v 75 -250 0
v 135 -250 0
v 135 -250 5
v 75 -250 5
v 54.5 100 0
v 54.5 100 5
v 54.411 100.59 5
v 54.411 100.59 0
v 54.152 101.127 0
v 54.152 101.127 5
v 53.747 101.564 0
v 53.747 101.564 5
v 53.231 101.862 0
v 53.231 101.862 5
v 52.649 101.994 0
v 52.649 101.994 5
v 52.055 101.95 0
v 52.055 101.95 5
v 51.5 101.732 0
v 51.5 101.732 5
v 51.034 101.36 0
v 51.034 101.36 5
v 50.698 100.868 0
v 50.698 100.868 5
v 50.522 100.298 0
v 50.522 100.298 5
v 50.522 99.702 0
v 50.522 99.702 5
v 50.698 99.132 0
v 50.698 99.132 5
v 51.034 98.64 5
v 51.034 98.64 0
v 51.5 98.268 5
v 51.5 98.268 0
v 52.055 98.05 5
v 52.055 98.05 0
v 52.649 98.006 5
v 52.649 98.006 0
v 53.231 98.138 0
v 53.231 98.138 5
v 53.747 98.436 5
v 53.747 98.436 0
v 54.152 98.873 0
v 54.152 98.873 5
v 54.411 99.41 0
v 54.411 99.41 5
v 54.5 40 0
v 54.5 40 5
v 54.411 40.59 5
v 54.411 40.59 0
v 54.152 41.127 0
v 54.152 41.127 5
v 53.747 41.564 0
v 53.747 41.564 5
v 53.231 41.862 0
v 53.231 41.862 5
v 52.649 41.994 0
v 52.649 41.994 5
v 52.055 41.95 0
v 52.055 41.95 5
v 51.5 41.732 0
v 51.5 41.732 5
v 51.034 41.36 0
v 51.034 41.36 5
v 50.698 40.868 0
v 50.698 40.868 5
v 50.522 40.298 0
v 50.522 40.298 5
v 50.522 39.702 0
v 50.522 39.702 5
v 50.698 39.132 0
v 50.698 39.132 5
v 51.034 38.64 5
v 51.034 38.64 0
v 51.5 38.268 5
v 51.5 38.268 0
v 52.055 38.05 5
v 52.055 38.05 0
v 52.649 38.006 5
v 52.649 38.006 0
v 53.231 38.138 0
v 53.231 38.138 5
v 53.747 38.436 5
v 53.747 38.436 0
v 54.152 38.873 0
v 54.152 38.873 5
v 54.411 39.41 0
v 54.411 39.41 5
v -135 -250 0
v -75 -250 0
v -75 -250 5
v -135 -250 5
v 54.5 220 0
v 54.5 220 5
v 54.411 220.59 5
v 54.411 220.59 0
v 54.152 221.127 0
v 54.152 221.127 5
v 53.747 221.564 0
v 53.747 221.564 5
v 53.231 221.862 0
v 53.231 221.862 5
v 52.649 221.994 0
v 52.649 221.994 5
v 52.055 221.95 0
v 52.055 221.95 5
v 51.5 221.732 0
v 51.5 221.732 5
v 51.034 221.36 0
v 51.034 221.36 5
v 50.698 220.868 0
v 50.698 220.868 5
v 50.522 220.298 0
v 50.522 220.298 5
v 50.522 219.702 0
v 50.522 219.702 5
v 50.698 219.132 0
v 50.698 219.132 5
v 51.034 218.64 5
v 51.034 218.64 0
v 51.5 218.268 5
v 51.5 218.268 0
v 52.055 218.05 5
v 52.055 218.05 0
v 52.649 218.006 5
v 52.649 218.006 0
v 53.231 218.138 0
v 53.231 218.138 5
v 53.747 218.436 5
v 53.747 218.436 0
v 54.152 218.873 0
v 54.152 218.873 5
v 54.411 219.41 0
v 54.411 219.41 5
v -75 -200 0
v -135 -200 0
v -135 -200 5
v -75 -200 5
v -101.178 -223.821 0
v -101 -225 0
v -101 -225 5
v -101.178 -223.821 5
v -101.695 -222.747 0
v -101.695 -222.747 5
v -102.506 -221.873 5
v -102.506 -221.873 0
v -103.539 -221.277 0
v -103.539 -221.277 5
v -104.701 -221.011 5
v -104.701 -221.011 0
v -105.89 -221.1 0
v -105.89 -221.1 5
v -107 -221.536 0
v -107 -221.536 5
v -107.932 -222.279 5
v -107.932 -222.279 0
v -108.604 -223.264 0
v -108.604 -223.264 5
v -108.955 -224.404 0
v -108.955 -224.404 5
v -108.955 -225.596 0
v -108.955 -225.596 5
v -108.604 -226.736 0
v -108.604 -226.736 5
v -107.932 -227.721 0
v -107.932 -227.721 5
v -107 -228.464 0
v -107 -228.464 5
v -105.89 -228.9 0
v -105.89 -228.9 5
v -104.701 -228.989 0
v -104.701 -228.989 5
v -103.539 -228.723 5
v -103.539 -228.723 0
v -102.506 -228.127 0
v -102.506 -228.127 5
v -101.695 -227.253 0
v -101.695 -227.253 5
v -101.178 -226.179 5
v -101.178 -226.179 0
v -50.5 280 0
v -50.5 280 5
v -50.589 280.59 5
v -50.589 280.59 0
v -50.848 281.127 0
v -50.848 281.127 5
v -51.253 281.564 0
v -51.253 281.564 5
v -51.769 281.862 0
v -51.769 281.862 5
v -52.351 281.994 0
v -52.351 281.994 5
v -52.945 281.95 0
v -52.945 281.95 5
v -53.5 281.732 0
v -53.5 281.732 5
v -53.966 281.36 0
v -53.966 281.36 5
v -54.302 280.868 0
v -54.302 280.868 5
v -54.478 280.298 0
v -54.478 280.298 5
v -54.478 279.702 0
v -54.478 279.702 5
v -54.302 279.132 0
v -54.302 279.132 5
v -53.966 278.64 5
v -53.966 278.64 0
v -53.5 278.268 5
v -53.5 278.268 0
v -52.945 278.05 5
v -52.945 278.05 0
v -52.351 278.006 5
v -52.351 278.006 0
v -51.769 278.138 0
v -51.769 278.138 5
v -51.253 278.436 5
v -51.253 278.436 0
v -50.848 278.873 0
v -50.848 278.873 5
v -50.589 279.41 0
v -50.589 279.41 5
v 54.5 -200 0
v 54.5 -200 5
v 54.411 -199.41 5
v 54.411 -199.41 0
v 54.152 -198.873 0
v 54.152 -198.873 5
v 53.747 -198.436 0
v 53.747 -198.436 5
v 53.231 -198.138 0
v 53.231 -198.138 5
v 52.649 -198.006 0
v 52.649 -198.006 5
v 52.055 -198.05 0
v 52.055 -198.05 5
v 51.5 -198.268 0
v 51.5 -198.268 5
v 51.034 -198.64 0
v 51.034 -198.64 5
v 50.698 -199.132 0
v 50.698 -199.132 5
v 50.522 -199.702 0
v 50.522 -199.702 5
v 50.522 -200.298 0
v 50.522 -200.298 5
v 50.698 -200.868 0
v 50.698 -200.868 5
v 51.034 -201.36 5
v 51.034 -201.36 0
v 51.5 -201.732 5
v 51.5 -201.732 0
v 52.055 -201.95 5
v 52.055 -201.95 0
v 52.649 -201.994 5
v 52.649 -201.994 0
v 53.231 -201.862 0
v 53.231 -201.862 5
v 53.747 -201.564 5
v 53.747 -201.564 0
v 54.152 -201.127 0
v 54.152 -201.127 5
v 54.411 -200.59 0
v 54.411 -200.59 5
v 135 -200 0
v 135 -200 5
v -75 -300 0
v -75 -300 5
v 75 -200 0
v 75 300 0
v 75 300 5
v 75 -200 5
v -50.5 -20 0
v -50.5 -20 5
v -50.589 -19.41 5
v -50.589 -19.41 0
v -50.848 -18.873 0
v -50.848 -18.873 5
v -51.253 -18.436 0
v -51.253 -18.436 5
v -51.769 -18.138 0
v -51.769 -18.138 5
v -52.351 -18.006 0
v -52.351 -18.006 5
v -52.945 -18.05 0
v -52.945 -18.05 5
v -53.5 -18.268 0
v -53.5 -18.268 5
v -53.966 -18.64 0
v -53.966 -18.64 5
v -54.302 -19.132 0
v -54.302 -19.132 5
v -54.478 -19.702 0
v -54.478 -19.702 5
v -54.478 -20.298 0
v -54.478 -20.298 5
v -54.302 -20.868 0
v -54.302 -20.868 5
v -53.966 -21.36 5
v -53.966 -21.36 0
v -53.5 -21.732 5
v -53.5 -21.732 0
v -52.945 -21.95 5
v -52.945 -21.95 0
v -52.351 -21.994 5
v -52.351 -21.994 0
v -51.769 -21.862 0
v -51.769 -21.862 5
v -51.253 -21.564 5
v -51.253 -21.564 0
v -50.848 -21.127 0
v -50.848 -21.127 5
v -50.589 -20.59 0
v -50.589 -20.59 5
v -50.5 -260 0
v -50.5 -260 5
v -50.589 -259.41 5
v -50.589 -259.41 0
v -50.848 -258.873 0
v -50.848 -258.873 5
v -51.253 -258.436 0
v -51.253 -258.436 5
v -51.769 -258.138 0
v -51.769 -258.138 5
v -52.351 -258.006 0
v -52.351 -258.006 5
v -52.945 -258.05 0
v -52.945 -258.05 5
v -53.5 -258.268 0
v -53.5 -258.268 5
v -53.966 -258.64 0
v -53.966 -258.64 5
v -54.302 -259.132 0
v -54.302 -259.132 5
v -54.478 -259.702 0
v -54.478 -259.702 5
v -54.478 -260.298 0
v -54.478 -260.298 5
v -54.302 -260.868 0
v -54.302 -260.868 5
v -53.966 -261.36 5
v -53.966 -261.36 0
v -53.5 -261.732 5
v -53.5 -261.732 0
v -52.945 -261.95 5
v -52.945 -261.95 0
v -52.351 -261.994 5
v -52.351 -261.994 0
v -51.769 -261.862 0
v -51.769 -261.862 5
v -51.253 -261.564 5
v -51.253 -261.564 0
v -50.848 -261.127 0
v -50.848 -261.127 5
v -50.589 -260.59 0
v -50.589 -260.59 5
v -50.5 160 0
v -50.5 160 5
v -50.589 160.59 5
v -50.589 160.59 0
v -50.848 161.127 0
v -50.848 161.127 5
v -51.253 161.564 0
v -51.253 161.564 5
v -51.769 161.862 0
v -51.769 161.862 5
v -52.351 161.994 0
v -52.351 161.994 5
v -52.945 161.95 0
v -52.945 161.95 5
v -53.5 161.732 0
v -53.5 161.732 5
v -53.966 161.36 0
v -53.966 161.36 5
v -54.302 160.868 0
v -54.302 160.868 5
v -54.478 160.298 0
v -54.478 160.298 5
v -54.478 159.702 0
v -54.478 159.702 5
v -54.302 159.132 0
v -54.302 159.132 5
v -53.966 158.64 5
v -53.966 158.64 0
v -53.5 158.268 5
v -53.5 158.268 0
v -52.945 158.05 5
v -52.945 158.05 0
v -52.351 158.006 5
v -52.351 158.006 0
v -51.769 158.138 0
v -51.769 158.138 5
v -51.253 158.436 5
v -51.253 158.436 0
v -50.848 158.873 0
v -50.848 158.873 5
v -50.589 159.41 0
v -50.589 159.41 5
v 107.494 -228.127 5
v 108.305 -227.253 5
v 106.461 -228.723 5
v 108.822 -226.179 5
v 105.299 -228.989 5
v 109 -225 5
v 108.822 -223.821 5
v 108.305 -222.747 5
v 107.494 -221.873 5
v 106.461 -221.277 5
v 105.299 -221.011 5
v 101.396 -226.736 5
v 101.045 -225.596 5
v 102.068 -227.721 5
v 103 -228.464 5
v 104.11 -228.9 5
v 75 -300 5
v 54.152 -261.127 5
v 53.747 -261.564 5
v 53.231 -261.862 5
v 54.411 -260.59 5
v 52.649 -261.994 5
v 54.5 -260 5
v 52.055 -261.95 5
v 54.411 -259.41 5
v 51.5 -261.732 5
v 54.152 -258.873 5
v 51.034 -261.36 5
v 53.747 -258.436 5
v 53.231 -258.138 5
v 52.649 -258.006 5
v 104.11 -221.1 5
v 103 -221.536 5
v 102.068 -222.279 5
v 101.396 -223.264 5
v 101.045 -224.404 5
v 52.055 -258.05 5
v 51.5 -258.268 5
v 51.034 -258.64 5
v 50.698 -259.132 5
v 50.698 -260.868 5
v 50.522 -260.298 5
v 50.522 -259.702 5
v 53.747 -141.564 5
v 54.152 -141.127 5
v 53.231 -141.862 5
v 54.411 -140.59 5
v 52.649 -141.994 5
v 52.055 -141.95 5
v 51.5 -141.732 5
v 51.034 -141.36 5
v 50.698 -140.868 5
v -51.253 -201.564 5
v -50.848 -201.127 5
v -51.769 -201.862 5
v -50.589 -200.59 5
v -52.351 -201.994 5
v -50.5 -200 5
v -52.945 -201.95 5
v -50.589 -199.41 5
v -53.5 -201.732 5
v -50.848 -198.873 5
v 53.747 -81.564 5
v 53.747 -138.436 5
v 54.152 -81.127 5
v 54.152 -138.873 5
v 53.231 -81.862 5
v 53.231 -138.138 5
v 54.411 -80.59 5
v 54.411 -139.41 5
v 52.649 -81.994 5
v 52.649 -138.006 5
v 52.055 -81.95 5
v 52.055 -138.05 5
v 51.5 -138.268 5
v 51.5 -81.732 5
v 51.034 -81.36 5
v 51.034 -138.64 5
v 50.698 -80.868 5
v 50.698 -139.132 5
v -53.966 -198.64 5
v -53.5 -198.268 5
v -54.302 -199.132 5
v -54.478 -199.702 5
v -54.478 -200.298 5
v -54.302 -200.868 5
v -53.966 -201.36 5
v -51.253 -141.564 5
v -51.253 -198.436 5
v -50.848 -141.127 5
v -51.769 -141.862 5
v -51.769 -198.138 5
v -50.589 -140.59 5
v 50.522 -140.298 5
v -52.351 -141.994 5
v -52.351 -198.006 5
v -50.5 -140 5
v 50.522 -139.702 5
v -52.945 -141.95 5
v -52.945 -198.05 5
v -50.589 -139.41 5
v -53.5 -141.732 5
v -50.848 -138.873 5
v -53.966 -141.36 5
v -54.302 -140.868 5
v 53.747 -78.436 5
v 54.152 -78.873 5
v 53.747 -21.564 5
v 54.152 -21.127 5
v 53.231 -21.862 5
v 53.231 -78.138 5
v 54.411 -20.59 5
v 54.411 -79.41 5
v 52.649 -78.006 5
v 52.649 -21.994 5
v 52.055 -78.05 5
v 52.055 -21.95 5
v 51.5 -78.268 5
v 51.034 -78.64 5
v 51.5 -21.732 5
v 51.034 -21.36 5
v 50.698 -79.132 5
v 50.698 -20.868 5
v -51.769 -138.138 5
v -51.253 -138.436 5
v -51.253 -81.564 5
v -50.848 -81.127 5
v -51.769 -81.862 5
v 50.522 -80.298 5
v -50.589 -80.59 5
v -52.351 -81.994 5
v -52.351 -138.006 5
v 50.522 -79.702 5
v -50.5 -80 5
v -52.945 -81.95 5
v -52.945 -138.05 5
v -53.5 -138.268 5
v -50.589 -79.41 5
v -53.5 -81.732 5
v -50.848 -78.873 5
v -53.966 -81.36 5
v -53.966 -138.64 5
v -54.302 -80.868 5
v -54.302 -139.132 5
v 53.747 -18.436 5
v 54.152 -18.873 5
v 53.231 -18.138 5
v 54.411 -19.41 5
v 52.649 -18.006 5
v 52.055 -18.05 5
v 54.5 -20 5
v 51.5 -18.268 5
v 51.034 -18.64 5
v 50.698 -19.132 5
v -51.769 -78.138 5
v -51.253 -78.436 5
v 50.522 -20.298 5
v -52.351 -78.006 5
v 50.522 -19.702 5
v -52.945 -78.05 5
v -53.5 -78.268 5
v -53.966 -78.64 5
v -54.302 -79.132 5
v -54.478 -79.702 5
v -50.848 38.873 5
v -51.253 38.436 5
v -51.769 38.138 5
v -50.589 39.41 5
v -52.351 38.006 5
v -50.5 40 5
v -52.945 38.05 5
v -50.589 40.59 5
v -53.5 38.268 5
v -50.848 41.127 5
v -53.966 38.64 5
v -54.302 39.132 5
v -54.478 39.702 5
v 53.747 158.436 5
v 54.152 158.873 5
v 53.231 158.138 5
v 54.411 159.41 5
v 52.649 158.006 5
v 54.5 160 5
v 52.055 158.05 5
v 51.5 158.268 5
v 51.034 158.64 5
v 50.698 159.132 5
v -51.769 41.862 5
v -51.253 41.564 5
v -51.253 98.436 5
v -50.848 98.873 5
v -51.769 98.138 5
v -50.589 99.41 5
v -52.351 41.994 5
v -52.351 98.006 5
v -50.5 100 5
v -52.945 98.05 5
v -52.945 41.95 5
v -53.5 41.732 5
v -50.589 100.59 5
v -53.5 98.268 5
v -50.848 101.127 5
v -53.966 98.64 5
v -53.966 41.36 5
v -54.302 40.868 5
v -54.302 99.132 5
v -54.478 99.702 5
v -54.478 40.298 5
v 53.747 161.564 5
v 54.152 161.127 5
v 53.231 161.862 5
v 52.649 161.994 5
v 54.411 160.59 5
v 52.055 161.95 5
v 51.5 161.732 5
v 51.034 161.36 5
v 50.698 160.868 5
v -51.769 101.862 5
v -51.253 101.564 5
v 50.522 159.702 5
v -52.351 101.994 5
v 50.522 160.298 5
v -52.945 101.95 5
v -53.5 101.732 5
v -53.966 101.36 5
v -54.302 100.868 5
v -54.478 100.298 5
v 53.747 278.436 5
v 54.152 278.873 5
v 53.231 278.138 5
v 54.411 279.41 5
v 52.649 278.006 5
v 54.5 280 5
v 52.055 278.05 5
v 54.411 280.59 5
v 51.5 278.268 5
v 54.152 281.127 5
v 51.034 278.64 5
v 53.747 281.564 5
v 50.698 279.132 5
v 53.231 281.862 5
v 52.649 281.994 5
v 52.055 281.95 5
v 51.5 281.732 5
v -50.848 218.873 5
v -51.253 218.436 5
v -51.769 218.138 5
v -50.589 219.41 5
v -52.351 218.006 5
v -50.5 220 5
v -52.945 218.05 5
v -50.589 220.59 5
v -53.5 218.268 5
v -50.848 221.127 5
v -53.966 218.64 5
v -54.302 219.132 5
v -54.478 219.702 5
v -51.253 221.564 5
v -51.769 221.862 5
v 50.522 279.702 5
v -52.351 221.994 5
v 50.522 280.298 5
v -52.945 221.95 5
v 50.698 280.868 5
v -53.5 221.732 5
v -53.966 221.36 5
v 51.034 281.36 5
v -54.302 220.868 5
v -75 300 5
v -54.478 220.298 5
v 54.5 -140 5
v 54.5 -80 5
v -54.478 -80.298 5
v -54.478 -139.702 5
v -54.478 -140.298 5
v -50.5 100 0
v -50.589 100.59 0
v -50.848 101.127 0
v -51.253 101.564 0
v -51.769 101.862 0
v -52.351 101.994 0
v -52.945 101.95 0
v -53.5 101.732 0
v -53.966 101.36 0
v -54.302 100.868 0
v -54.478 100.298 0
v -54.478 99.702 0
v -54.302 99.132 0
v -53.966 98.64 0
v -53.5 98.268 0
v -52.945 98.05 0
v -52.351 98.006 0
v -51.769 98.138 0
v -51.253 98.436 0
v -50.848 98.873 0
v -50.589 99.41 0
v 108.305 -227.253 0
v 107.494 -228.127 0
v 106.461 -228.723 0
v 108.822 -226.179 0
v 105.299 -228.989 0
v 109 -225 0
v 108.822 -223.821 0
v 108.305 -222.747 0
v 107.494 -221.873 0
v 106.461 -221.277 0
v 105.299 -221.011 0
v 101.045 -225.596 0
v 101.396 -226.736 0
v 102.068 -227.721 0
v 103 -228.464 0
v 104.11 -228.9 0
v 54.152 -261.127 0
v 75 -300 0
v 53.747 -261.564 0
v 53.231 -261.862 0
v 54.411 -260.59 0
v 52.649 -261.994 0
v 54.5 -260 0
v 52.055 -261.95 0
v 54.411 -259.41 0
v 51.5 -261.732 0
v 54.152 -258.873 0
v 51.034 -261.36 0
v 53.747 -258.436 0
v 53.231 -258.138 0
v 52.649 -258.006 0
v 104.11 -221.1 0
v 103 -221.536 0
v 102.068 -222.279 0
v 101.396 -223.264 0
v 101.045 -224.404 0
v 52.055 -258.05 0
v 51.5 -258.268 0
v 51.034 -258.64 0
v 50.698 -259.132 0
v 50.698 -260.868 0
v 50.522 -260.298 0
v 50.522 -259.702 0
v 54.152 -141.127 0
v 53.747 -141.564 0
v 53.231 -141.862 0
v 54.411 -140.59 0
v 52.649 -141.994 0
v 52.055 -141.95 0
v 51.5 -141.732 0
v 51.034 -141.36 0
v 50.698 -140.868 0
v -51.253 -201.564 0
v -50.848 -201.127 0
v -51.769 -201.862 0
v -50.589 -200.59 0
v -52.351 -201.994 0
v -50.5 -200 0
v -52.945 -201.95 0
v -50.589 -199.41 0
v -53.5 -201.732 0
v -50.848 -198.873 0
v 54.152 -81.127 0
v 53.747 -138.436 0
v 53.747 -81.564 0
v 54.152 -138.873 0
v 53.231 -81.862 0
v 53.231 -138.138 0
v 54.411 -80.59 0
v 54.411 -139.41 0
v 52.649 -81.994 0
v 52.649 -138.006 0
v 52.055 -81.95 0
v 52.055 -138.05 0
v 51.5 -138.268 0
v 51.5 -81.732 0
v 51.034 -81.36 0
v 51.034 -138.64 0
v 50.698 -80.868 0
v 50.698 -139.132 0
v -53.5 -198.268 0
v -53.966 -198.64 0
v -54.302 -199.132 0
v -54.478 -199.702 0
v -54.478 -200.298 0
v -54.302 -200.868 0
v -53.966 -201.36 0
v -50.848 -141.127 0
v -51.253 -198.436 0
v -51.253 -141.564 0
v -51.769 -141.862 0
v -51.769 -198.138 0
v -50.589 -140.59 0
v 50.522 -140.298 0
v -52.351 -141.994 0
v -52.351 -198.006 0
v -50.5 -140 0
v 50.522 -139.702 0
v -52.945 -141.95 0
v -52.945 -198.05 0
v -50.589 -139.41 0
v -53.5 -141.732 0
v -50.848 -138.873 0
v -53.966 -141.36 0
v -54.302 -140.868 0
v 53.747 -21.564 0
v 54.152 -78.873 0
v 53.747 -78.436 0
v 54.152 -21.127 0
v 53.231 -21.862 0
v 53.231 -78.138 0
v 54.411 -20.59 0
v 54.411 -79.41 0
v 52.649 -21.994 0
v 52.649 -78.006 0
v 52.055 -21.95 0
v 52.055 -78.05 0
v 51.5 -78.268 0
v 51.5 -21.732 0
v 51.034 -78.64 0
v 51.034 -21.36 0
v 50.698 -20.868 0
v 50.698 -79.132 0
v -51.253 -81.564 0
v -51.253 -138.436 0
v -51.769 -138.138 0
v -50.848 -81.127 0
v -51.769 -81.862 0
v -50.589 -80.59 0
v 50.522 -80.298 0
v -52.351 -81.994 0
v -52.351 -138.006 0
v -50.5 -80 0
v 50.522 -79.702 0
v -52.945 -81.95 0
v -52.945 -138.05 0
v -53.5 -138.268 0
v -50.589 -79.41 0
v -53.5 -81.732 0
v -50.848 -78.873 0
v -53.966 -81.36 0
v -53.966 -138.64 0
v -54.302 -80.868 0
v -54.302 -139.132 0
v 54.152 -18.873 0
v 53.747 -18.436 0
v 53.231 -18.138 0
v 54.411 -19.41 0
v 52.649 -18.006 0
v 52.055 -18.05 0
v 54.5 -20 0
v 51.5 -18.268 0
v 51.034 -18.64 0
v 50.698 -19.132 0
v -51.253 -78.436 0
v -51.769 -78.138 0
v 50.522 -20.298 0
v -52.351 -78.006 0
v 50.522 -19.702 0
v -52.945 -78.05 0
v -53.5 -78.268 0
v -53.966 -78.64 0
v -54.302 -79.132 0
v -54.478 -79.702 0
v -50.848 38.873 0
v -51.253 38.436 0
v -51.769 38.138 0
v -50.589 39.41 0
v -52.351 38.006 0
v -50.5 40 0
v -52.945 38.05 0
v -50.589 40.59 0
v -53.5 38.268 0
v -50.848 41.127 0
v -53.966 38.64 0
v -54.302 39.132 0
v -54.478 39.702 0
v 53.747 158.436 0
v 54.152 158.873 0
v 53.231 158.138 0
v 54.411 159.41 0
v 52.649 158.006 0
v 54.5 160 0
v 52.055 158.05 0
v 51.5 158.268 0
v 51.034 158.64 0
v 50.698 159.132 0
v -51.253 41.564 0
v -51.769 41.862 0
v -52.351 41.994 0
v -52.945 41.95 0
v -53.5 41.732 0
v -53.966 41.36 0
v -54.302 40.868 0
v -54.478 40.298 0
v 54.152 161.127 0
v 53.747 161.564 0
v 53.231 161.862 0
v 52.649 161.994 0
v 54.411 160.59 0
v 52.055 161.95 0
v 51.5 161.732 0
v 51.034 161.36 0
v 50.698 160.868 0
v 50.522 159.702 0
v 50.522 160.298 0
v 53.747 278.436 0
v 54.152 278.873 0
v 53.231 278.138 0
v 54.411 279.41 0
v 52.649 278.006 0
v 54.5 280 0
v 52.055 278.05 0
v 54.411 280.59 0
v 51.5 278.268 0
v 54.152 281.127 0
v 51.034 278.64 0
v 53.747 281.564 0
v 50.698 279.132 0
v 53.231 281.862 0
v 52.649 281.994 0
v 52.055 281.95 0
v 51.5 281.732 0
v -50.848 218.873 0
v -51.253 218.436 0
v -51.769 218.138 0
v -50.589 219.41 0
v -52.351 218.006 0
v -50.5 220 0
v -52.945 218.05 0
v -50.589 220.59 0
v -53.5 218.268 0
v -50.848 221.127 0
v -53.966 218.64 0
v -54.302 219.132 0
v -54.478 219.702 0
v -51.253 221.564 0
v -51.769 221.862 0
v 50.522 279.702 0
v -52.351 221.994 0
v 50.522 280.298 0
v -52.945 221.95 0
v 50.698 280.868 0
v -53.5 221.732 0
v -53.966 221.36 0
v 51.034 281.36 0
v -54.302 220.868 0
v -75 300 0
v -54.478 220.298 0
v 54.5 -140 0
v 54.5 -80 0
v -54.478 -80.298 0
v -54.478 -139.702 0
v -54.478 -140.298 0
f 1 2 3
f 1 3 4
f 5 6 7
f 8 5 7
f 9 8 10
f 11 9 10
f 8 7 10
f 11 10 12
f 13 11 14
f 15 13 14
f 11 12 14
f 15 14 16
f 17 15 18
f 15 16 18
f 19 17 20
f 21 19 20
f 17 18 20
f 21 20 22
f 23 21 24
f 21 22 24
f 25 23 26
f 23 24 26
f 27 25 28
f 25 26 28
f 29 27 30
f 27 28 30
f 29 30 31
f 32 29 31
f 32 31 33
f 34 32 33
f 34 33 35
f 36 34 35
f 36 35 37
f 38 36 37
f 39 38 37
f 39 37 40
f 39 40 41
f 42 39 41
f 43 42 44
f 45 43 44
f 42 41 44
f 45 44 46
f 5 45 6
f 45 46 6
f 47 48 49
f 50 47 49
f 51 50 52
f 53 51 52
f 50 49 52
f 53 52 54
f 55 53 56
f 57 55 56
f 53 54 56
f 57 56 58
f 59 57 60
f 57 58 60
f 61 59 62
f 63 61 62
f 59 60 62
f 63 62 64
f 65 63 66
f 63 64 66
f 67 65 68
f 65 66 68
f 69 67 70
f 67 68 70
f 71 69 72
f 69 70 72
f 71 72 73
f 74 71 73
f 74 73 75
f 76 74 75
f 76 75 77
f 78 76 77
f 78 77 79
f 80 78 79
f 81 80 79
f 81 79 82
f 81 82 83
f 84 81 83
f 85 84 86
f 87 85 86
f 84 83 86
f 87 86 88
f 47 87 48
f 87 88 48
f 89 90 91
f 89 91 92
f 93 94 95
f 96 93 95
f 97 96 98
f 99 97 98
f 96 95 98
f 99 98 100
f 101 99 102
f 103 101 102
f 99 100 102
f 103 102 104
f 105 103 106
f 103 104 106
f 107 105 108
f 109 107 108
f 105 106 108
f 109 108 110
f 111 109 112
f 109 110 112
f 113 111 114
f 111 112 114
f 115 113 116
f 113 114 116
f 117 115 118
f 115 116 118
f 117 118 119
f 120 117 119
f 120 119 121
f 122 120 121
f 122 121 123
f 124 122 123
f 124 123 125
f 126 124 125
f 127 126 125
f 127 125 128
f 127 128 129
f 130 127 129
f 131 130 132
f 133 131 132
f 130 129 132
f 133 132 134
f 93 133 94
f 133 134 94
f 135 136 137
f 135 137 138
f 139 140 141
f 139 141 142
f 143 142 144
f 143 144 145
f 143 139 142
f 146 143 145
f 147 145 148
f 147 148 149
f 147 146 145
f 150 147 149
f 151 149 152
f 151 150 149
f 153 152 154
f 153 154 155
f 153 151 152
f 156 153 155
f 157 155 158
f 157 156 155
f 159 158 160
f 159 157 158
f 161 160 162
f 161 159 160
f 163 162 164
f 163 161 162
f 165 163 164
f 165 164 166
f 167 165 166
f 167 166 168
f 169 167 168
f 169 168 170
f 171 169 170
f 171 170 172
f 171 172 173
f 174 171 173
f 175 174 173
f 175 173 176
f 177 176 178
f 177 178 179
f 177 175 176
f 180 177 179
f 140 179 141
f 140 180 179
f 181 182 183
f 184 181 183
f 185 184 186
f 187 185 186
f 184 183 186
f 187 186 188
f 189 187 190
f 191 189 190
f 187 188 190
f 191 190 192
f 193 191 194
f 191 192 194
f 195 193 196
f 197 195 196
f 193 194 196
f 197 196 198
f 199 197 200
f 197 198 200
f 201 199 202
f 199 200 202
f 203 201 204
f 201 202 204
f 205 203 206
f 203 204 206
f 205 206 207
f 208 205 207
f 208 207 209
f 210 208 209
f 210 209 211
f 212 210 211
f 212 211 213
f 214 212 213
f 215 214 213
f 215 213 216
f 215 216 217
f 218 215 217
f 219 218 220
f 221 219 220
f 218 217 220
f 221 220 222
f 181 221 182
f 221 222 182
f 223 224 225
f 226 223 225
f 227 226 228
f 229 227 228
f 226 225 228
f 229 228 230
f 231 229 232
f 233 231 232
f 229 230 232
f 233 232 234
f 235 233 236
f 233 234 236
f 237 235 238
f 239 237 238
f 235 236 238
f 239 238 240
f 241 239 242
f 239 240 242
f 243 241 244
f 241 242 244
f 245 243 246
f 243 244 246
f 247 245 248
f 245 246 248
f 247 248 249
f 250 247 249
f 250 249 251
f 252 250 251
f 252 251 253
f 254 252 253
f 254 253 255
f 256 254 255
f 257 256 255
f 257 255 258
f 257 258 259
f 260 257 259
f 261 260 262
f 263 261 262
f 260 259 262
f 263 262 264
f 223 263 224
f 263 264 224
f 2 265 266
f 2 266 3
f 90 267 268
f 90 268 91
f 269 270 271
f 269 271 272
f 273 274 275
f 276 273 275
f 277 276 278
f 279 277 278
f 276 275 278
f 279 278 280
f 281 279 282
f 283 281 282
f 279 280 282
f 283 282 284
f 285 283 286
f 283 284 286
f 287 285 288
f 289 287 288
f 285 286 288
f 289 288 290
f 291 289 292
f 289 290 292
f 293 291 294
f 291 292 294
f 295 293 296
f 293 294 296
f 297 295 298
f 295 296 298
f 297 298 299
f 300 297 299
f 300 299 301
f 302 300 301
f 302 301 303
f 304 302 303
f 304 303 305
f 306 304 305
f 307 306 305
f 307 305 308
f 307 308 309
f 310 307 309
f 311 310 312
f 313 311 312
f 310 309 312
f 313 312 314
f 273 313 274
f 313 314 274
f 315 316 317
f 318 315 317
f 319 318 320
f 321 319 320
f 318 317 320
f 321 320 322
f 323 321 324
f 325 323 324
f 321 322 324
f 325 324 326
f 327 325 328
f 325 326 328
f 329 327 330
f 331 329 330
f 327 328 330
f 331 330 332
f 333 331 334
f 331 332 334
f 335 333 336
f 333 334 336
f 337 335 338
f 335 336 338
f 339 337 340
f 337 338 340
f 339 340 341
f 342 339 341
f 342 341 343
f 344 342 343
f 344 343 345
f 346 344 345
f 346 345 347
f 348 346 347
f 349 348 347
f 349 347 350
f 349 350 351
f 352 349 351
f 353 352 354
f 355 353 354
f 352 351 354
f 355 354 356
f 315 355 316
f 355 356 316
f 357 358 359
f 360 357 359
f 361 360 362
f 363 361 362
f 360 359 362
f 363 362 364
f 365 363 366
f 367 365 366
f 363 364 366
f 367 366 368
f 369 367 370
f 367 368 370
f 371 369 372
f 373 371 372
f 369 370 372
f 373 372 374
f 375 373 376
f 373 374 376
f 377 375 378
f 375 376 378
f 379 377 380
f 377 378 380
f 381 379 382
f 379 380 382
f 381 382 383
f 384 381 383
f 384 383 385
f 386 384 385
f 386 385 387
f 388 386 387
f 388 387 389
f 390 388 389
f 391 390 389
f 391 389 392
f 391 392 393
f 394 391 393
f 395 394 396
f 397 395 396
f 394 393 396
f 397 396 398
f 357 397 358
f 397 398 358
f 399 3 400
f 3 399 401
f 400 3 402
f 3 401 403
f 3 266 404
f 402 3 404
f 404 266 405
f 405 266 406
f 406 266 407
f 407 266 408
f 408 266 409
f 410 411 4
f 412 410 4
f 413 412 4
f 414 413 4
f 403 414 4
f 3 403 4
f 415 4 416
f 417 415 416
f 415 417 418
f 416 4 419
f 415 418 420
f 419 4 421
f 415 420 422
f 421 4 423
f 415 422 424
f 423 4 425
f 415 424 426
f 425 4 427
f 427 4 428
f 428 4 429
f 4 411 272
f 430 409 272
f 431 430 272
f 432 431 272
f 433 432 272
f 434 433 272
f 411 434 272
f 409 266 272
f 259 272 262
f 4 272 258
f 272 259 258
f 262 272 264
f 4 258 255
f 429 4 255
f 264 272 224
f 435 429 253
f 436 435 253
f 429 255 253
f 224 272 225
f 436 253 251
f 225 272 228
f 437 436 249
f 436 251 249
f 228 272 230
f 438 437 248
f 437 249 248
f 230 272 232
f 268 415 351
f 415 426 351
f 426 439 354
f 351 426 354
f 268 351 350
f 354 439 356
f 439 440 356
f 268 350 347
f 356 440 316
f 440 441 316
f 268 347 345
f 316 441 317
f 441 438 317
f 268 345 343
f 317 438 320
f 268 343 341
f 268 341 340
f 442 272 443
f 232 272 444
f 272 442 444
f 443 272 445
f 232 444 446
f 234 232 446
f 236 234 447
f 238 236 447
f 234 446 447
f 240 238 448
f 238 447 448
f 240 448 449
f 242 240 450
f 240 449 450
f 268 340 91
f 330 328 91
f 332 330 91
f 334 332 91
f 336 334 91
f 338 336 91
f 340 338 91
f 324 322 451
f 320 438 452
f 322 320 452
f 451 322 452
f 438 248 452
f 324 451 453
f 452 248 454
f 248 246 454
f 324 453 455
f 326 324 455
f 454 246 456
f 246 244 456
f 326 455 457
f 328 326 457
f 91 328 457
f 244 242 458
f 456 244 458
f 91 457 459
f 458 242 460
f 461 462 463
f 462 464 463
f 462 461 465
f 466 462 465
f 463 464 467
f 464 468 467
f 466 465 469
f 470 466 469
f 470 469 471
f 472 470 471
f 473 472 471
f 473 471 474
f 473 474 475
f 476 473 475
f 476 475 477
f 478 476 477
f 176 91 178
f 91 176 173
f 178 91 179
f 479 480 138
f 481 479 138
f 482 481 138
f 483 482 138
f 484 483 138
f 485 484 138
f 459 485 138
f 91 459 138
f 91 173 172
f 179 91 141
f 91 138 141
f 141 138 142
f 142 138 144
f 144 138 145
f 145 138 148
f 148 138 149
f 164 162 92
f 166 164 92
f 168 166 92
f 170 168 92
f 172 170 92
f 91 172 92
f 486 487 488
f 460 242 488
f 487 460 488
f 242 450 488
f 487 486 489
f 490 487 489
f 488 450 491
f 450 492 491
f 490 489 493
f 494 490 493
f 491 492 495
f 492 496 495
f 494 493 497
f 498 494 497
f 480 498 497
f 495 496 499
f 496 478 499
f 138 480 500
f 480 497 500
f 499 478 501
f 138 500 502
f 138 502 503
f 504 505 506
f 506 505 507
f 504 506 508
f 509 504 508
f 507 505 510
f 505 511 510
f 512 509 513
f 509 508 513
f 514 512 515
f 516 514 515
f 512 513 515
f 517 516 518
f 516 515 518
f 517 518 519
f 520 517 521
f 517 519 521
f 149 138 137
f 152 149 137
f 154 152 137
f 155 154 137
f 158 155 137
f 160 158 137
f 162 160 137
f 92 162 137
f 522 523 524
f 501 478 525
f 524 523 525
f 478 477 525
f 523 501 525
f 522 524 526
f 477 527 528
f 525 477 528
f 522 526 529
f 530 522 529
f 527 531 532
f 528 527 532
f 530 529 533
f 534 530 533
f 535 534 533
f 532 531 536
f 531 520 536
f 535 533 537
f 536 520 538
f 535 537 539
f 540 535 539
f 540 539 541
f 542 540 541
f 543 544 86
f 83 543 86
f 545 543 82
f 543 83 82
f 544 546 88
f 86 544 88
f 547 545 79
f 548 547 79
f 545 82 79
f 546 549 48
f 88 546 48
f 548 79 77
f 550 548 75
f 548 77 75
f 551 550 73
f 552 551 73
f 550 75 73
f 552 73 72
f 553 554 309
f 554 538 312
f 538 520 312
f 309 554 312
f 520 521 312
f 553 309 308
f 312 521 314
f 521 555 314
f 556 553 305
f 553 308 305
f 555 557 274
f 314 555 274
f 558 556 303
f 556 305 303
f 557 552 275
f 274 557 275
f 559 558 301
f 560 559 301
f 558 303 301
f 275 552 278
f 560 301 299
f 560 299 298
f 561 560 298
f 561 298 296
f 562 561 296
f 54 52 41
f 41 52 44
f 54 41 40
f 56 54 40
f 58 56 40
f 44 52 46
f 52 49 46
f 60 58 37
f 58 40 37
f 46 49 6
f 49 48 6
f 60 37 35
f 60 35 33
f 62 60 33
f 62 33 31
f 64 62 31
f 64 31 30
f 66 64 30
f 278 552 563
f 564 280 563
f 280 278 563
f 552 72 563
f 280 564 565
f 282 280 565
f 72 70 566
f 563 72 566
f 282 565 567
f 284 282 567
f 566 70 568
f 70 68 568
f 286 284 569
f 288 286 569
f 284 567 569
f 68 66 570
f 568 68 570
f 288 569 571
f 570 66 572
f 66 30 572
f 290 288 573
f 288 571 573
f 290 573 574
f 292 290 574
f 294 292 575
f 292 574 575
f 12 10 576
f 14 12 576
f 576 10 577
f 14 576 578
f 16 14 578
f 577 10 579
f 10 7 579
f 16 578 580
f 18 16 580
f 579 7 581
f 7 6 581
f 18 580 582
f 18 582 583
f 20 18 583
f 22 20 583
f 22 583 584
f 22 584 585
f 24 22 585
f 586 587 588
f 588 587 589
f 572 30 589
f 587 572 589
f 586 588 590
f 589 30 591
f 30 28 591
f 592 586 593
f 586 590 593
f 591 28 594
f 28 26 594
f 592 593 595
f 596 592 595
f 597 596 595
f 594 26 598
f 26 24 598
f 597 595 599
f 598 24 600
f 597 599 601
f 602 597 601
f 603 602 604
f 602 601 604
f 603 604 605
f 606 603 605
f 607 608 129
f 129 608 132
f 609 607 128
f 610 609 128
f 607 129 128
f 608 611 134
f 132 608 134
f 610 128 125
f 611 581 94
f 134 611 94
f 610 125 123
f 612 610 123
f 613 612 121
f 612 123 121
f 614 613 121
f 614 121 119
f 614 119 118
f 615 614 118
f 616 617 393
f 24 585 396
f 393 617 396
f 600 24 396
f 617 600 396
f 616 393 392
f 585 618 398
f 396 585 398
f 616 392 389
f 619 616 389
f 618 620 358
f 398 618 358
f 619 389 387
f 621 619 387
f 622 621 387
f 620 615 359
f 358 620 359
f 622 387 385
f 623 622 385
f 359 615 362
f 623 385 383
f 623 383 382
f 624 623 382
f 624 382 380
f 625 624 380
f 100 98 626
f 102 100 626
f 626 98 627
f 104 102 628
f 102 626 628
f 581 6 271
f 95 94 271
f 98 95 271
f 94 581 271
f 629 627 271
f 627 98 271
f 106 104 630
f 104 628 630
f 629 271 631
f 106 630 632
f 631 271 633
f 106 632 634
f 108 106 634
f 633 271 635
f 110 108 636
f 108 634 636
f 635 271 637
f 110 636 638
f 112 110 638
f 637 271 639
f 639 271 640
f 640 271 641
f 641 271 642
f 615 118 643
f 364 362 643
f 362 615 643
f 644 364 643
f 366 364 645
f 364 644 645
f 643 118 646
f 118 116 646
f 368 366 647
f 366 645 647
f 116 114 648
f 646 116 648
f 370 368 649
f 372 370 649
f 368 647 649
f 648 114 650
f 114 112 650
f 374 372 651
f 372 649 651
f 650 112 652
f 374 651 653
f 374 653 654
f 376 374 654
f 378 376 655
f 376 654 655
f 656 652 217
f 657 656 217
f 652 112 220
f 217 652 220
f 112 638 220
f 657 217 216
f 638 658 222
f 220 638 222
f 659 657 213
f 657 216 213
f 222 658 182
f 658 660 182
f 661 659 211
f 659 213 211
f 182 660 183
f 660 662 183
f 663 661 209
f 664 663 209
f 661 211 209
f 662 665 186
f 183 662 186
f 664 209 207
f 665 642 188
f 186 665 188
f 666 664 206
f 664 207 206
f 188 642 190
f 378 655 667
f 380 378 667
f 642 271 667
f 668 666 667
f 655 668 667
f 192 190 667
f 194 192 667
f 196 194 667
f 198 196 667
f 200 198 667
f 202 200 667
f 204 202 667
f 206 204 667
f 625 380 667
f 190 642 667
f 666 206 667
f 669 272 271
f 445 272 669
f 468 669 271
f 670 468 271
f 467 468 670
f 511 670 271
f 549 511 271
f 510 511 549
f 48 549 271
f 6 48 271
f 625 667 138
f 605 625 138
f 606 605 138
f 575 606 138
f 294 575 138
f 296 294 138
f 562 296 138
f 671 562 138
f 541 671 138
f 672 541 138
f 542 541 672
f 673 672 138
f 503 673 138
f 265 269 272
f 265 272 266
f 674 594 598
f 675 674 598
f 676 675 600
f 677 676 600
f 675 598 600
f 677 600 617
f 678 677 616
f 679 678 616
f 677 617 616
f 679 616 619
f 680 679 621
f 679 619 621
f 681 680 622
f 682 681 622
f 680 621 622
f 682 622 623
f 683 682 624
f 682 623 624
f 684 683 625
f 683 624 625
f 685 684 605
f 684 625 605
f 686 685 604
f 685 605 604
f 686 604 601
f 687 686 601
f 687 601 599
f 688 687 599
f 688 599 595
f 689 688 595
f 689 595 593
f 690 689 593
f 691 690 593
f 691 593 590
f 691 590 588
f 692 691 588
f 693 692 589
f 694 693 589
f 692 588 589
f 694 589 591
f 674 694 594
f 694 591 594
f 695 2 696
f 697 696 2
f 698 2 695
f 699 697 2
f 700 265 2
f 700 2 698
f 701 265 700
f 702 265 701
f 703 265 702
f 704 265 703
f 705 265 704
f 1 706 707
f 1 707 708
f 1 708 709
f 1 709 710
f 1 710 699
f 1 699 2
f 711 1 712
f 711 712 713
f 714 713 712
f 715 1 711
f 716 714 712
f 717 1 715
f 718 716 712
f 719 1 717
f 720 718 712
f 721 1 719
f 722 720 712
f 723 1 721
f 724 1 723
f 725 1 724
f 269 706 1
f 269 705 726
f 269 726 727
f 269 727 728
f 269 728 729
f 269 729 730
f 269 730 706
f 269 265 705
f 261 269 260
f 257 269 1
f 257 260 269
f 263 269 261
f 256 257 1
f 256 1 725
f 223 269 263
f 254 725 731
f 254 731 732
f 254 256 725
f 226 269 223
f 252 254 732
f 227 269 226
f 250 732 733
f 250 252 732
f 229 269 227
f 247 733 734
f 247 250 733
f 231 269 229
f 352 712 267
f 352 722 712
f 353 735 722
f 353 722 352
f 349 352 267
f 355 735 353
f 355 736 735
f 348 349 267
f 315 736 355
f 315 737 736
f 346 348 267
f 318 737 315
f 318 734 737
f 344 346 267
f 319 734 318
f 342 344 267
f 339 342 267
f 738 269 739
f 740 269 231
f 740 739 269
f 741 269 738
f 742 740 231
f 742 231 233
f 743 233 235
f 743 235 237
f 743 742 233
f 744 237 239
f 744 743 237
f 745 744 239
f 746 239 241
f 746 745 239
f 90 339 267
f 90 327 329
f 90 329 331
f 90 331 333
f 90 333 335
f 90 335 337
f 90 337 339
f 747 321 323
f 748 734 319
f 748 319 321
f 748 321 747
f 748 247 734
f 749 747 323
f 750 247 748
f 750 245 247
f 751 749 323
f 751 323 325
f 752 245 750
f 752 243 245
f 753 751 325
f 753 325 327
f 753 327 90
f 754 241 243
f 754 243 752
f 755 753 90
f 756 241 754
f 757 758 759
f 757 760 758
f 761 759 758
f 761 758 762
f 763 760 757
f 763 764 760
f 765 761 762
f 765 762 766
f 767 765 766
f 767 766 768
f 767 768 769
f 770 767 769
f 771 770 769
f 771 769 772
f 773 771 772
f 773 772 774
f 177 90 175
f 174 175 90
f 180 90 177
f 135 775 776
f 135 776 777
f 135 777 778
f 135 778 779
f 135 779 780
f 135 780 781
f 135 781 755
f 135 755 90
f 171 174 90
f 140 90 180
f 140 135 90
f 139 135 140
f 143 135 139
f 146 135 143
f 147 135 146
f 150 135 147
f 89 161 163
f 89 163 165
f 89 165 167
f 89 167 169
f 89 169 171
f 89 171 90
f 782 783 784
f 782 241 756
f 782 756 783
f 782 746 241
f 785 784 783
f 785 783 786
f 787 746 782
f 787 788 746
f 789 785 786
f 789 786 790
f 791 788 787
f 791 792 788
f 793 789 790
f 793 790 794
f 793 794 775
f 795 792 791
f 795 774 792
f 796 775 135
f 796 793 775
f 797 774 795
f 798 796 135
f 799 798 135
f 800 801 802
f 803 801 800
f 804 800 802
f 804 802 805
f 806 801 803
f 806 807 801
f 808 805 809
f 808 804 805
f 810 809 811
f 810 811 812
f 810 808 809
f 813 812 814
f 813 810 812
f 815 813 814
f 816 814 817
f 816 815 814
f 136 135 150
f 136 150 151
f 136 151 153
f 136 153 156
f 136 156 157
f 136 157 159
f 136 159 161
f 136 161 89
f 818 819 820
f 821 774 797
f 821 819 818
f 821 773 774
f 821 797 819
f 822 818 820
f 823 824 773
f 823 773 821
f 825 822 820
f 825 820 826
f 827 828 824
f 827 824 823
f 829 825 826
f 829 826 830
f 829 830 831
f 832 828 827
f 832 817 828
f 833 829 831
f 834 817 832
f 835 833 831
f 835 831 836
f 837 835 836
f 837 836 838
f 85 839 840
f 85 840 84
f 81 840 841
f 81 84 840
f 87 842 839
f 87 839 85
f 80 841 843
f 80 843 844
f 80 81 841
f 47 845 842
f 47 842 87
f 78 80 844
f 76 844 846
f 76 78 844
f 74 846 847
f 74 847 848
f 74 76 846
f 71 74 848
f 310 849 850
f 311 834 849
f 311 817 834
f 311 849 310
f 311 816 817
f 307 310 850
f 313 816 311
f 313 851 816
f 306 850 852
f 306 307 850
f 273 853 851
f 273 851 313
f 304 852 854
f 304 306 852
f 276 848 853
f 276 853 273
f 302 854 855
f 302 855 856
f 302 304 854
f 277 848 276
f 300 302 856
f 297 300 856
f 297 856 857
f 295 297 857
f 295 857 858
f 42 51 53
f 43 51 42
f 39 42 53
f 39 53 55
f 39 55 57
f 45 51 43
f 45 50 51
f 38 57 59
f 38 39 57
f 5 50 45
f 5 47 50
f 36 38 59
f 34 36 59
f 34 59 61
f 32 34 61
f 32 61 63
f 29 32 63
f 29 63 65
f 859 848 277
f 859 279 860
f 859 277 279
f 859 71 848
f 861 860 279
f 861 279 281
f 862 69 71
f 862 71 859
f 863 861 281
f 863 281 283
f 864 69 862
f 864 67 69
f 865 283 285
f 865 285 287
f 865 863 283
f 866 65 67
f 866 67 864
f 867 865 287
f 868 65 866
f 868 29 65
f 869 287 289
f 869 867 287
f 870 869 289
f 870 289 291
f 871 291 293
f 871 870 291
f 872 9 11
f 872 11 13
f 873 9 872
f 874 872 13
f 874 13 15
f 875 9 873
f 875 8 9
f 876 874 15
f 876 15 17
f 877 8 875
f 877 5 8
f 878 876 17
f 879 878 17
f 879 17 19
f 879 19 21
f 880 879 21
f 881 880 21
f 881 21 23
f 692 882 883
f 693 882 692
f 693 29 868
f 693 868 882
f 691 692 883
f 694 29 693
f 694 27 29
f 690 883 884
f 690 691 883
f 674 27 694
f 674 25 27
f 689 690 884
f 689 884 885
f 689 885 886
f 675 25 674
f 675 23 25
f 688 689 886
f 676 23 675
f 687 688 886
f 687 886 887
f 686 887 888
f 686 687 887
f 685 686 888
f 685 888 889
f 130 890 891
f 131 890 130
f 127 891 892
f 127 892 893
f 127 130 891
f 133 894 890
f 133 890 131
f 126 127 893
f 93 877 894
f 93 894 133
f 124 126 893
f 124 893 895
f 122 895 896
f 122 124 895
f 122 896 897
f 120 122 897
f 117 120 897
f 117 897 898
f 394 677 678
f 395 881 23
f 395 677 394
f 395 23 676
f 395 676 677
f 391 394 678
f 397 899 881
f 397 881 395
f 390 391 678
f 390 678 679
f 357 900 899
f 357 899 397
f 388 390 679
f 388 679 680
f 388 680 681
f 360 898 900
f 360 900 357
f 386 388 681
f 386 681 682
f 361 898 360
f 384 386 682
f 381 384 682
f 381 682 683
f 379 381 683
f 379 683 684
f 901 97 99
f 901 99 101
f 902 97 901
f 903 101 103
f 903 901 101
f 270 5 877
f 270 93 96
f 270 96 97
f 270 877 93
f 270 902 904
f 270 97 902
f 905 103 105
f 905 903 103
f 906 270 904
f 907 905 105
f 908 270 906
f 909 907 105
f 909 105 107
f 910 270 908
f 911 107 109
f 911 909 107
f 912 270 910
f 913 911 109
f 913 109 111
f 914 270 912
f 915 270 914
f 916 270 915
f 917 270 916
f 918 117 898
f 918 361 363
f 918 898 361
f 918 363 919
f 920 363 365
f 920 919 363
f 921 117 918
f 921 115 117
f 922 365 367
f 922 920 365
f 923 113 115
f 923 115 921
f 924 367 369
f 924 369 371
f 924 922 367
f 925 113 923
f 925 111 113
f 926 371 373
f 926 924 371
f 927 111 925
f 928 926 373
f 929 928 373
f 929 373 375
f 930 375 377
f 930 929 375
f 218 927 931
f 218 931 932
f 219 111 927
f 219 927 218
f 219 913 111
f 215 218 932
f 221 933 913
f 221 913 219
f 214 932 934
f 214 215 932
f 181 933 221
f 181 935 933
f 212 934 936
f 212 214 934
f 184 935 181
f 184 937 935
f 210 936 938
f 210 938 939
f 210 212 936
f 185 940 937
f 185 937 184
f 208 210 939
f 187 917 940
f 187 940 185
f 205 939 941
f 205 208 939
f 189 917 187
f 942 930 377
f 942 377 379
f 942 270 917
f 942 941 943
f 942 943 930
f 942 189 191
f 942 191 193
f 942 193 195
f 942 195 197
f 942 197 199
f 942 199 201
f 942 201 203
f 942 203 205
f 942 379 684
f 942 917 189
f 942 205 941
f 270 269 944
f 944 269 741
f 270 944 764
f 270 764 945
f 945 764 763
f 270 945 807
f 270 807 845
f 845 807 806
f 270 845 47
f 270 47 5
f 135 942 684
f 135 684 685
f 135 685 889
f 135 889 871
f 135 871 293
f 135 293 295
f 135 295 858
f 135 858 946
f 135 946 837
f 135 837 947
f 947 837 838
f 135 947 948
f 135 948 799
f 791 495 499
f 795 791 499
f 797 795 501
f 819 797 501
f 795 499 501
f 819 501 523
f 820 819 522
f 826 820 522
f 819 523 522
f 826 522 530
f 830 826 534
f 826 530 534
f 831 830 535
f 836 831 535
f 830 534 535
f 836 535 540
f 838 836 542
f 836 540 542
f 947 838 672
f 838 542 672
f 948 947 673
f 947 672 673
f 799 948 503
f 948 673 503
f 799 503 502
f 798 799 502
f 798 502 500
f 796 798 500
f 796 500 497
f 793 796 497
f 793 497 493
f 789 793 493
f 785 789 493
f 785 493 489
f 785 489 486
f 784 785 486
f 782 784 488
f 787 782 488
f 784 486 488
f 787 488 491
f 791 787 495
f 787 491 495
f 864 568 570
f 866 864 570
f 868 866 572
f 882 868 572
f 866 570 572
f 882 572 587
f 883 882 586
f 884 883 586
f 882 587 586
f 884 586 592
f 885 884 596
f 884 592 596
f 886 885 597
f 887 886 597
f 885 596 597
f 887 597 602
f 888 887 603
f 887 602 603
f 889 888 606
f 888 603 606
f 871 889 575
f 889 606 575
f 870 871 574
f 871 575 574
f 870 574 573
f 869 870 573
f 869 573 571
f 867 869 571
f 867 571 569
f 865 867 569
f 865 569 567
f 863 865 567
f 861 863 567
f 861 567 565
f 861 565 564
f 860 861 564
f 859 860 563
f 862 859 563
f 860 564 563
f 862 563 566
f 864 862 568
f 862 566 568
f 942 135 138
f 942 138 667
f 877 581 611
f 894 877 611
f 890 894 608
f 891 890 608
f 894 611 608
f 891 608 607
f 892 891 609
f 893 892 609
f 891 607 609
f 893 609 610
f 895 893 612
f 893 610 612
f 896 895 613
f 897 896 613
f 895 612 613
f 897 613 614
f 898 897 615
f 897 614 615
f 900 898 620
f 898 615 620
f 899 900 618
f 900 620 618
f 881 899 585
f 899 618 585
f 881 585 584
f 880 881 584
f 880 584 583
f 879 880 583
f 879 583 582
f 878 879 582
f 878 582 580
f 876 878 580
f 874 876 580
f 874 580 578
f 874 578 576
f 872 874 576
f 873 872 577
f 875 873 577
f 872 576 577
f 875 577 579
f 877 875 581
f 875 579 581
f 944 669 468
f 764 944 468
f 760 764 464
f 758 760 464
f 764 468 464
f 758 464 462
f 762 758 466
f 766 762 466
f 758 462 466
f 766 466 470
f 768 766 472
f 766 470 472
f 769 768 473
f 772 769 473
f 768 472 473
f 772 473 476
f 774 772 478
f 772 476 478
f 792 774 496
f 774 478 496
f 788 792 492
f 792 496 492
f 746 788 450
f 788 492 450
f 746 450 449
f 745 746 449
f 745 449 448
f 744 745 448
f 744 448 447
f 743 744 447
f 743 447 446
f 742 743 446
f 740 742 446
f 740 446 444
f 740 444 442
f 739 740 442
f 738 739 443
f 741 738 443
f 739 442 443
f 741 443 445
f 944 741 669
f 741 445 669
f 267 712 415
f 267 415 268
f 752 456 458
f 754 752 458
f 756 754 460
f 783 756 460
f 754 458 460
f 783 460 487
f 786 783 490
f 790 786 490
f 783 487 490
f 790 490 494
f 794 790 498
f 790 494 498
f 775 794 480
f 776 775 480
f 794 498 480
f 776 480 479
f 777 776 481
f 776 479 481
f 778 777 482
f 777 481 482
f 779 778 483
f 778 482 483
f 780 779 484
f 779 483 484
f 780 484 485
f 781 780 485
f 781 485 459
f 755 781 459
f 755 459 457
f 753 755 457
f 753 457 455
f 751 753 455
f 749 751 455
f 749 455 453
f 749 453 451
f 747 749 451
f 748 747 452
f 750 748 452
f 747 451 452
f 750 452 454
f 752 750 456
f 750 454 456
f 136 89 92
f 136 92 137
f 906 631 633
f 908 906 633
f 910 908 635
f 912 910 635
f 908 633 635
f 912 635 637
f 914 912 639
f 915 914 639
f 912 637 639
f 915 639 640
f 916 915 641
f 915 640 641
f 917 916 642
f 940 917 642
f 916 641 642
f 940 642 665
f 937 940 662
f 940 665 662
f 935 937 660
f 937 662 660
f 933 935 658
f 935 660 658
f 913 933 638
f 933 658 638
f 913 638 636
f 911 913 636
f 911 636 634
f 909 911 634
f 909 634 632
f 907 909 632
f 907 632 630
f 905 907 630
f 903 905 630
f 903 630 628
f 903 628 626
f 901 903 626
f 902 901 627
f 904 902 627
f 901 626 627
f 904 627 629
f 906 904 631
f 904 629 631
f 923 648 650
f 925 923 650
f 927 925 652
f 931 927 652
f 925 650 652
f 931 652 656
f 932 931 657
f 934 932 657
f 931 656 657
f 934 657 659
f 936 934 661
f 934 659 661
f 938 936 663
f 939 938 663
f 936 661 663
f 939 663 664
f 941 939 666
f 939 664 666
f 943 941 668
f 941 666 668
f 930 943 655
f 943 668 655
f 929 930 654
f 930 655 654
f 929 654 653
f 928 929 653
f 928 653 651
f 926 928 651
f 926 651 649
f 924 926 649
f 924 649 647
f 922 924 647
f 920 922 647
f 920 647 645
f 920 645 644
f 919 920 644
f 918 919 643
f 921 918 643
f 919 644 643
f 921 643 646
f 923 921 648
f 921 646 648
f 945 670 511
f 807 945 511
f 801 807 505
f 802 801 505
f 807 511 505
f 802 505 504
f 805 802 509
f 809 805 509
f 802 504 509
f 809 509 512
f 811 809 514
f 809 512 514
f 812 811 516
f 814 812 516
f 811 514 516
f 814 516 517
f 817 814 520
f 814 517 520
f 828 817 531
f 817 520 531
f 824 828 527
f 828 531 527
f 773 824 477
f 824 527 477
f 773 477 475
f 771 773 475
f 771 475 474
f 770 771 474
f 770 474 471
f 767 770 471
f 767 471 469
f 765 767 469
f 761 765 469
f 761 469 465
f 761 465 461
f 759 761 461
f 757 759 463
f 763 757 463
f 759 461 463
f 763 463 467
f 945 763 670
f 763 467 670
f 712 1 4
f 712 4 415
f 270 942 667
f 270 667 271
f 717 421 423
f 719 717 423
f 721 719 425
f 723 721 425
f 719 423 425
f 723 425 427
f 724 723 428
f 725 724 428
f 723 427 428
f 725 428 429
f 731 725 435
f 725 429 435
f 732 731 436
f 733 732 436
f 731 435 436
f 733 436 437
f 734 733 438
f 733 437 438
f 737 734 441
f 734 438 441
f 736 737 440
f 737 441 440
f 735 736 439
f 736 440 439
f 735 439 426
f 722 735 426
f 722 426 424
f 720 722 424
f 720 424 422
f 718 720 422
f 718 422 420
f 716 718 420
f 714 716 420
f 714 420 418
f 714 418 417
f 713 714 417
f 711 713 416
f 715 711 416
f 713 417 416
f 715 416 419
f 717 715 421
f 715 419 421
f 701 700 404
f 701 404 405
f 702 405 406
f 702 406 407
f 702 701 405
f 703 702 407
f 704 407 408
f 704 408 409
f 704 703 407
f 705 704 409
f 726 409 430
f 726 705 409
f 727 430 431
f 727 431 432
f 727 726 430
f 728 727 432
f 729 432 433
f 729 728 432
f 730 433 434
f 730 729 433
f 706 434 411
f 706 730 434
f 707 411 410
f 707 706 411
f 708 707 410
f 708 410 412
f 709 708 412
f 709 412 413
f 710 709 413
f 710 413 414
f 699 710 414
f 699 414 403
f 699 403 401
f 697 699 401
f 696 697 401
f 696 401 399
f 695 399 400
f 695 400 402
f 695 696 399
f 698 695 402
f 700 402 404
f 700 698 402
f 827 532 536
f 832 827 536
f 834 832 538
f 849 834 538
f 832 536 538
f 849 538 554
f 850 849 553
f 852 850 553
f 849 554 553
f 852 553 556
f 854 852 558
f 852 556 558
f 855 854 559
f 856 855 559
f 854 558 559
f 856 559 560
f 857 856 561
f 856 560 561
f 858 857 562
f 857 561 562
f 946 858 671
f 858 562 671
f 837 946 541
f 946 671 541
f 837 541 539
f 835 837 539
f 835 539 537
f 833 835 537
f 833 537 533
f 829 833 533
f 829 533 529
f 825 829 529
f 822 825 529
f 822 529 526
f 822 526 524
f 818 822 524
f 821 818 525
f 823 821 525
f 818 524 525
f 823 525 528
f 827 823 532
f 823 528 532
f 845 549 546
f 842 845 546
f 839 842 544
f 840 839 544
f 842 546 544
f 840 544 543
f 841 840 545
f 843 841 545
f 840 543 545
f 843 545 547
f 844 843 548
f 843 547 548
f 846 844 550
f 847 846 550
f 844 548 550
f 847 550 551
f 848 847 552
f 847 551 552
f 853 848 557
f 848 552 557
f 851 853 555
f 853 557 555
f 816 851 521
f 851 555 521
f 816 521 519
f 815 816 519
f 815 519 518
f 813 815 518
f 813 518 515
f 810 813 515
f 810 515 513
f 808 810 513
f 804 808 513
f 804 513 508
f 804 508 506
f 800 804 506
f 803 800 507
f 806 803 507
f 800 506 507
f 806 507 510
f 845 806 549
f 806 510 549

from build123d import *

# Parameters (mm, degrees)
SKETCH2_R           = 4
BOSS_EXTRUDE1_DEPTH = 5
SKETCH3_R           = 2
CUT_EXTRUDE1_DEPTH  = 5


with BuildPart() as part:
    # Sketch2 → Boss-Extrude1 (new body)
    with BuildSketch(Plane.XY):
        Polygon((75, 300), (75, -200), (135, -200), (135, -250), (75, -250), (75, -300), (-75, -300), (-75, -250), (-135, -250), (-135, -200), (-75, -200), (-75, 300), align=None)
        with Locations((-105, -225)):
            Circle(SKETCH2_R, mode=Mode.SUBTRACT)
        with Locations((105, -225)):
            Circle(SKETCH2_R, mode=Mode.SUBTRACT)
    extrude(amount=BOSS_EXTRUDE1_DEPTH)

    # Sketch3 → Cut-Extrude1 (cut)
    with BuildSketch(Plane.XY.offset(5)):
        with Locations((-52.5, 280)):
            Circle(SKETCH3_R)
        with Locations((-52.5, 220)):
            Circle(SKETCH3_R)
        with Locations((-52.5, 160)):
            Circle(SKETCH3_R)
        with Locations((-52.5, 100)):
            Circle(SKETCH3_R)
        with Locations((-52.5, 40)):
            Circle(SKETCH3_R)
        with Locations((-52.5, -20)):
            Circle(SKETCH3_R)
        with Locations((-52.5, -80)):
            Circle(SKETCH3_R)
        with Locations((-52.5, -140)):
            Circle(SKETCH3_R)
        with Locations((-52.5, -200)):
            Circle(SKETCH3_R)
        with Locations((-52.5, -260)):
            Circle(SKETCH3_R)
        with Locations((52.5, -260)):
            Circle(SKETCH3_R)
        with Locations((52.5, -200)):
            Circle(SKETCH3_R)
        with Locations((52.5, -140)):
            Circle(SKETCH3_R)
        with Locations((52.5, -80)):
            Circle(SKETCH3_R)
        with Locations((52.5, -20)):
            Circle(SKETCH3_R)
        with Locations((52.5, 40)):
            Circle(SKETCH3_R)
        with Locations((52.5, 100)):
            Circle(SKETCH3_R)
        with Locations((52.5, 160)):
            Circle(SKETCH3_R)
        with Locations((52.5, 220)):
            Circle(SKETCH3_R)
        with Locations((52.5, 280)):
            Circle(SKETCH3_R)
    extrude(amount=-CUT_EXTRUDE1_DEPTH, mode=Mode.SUBTRACT)


solid = part.part
